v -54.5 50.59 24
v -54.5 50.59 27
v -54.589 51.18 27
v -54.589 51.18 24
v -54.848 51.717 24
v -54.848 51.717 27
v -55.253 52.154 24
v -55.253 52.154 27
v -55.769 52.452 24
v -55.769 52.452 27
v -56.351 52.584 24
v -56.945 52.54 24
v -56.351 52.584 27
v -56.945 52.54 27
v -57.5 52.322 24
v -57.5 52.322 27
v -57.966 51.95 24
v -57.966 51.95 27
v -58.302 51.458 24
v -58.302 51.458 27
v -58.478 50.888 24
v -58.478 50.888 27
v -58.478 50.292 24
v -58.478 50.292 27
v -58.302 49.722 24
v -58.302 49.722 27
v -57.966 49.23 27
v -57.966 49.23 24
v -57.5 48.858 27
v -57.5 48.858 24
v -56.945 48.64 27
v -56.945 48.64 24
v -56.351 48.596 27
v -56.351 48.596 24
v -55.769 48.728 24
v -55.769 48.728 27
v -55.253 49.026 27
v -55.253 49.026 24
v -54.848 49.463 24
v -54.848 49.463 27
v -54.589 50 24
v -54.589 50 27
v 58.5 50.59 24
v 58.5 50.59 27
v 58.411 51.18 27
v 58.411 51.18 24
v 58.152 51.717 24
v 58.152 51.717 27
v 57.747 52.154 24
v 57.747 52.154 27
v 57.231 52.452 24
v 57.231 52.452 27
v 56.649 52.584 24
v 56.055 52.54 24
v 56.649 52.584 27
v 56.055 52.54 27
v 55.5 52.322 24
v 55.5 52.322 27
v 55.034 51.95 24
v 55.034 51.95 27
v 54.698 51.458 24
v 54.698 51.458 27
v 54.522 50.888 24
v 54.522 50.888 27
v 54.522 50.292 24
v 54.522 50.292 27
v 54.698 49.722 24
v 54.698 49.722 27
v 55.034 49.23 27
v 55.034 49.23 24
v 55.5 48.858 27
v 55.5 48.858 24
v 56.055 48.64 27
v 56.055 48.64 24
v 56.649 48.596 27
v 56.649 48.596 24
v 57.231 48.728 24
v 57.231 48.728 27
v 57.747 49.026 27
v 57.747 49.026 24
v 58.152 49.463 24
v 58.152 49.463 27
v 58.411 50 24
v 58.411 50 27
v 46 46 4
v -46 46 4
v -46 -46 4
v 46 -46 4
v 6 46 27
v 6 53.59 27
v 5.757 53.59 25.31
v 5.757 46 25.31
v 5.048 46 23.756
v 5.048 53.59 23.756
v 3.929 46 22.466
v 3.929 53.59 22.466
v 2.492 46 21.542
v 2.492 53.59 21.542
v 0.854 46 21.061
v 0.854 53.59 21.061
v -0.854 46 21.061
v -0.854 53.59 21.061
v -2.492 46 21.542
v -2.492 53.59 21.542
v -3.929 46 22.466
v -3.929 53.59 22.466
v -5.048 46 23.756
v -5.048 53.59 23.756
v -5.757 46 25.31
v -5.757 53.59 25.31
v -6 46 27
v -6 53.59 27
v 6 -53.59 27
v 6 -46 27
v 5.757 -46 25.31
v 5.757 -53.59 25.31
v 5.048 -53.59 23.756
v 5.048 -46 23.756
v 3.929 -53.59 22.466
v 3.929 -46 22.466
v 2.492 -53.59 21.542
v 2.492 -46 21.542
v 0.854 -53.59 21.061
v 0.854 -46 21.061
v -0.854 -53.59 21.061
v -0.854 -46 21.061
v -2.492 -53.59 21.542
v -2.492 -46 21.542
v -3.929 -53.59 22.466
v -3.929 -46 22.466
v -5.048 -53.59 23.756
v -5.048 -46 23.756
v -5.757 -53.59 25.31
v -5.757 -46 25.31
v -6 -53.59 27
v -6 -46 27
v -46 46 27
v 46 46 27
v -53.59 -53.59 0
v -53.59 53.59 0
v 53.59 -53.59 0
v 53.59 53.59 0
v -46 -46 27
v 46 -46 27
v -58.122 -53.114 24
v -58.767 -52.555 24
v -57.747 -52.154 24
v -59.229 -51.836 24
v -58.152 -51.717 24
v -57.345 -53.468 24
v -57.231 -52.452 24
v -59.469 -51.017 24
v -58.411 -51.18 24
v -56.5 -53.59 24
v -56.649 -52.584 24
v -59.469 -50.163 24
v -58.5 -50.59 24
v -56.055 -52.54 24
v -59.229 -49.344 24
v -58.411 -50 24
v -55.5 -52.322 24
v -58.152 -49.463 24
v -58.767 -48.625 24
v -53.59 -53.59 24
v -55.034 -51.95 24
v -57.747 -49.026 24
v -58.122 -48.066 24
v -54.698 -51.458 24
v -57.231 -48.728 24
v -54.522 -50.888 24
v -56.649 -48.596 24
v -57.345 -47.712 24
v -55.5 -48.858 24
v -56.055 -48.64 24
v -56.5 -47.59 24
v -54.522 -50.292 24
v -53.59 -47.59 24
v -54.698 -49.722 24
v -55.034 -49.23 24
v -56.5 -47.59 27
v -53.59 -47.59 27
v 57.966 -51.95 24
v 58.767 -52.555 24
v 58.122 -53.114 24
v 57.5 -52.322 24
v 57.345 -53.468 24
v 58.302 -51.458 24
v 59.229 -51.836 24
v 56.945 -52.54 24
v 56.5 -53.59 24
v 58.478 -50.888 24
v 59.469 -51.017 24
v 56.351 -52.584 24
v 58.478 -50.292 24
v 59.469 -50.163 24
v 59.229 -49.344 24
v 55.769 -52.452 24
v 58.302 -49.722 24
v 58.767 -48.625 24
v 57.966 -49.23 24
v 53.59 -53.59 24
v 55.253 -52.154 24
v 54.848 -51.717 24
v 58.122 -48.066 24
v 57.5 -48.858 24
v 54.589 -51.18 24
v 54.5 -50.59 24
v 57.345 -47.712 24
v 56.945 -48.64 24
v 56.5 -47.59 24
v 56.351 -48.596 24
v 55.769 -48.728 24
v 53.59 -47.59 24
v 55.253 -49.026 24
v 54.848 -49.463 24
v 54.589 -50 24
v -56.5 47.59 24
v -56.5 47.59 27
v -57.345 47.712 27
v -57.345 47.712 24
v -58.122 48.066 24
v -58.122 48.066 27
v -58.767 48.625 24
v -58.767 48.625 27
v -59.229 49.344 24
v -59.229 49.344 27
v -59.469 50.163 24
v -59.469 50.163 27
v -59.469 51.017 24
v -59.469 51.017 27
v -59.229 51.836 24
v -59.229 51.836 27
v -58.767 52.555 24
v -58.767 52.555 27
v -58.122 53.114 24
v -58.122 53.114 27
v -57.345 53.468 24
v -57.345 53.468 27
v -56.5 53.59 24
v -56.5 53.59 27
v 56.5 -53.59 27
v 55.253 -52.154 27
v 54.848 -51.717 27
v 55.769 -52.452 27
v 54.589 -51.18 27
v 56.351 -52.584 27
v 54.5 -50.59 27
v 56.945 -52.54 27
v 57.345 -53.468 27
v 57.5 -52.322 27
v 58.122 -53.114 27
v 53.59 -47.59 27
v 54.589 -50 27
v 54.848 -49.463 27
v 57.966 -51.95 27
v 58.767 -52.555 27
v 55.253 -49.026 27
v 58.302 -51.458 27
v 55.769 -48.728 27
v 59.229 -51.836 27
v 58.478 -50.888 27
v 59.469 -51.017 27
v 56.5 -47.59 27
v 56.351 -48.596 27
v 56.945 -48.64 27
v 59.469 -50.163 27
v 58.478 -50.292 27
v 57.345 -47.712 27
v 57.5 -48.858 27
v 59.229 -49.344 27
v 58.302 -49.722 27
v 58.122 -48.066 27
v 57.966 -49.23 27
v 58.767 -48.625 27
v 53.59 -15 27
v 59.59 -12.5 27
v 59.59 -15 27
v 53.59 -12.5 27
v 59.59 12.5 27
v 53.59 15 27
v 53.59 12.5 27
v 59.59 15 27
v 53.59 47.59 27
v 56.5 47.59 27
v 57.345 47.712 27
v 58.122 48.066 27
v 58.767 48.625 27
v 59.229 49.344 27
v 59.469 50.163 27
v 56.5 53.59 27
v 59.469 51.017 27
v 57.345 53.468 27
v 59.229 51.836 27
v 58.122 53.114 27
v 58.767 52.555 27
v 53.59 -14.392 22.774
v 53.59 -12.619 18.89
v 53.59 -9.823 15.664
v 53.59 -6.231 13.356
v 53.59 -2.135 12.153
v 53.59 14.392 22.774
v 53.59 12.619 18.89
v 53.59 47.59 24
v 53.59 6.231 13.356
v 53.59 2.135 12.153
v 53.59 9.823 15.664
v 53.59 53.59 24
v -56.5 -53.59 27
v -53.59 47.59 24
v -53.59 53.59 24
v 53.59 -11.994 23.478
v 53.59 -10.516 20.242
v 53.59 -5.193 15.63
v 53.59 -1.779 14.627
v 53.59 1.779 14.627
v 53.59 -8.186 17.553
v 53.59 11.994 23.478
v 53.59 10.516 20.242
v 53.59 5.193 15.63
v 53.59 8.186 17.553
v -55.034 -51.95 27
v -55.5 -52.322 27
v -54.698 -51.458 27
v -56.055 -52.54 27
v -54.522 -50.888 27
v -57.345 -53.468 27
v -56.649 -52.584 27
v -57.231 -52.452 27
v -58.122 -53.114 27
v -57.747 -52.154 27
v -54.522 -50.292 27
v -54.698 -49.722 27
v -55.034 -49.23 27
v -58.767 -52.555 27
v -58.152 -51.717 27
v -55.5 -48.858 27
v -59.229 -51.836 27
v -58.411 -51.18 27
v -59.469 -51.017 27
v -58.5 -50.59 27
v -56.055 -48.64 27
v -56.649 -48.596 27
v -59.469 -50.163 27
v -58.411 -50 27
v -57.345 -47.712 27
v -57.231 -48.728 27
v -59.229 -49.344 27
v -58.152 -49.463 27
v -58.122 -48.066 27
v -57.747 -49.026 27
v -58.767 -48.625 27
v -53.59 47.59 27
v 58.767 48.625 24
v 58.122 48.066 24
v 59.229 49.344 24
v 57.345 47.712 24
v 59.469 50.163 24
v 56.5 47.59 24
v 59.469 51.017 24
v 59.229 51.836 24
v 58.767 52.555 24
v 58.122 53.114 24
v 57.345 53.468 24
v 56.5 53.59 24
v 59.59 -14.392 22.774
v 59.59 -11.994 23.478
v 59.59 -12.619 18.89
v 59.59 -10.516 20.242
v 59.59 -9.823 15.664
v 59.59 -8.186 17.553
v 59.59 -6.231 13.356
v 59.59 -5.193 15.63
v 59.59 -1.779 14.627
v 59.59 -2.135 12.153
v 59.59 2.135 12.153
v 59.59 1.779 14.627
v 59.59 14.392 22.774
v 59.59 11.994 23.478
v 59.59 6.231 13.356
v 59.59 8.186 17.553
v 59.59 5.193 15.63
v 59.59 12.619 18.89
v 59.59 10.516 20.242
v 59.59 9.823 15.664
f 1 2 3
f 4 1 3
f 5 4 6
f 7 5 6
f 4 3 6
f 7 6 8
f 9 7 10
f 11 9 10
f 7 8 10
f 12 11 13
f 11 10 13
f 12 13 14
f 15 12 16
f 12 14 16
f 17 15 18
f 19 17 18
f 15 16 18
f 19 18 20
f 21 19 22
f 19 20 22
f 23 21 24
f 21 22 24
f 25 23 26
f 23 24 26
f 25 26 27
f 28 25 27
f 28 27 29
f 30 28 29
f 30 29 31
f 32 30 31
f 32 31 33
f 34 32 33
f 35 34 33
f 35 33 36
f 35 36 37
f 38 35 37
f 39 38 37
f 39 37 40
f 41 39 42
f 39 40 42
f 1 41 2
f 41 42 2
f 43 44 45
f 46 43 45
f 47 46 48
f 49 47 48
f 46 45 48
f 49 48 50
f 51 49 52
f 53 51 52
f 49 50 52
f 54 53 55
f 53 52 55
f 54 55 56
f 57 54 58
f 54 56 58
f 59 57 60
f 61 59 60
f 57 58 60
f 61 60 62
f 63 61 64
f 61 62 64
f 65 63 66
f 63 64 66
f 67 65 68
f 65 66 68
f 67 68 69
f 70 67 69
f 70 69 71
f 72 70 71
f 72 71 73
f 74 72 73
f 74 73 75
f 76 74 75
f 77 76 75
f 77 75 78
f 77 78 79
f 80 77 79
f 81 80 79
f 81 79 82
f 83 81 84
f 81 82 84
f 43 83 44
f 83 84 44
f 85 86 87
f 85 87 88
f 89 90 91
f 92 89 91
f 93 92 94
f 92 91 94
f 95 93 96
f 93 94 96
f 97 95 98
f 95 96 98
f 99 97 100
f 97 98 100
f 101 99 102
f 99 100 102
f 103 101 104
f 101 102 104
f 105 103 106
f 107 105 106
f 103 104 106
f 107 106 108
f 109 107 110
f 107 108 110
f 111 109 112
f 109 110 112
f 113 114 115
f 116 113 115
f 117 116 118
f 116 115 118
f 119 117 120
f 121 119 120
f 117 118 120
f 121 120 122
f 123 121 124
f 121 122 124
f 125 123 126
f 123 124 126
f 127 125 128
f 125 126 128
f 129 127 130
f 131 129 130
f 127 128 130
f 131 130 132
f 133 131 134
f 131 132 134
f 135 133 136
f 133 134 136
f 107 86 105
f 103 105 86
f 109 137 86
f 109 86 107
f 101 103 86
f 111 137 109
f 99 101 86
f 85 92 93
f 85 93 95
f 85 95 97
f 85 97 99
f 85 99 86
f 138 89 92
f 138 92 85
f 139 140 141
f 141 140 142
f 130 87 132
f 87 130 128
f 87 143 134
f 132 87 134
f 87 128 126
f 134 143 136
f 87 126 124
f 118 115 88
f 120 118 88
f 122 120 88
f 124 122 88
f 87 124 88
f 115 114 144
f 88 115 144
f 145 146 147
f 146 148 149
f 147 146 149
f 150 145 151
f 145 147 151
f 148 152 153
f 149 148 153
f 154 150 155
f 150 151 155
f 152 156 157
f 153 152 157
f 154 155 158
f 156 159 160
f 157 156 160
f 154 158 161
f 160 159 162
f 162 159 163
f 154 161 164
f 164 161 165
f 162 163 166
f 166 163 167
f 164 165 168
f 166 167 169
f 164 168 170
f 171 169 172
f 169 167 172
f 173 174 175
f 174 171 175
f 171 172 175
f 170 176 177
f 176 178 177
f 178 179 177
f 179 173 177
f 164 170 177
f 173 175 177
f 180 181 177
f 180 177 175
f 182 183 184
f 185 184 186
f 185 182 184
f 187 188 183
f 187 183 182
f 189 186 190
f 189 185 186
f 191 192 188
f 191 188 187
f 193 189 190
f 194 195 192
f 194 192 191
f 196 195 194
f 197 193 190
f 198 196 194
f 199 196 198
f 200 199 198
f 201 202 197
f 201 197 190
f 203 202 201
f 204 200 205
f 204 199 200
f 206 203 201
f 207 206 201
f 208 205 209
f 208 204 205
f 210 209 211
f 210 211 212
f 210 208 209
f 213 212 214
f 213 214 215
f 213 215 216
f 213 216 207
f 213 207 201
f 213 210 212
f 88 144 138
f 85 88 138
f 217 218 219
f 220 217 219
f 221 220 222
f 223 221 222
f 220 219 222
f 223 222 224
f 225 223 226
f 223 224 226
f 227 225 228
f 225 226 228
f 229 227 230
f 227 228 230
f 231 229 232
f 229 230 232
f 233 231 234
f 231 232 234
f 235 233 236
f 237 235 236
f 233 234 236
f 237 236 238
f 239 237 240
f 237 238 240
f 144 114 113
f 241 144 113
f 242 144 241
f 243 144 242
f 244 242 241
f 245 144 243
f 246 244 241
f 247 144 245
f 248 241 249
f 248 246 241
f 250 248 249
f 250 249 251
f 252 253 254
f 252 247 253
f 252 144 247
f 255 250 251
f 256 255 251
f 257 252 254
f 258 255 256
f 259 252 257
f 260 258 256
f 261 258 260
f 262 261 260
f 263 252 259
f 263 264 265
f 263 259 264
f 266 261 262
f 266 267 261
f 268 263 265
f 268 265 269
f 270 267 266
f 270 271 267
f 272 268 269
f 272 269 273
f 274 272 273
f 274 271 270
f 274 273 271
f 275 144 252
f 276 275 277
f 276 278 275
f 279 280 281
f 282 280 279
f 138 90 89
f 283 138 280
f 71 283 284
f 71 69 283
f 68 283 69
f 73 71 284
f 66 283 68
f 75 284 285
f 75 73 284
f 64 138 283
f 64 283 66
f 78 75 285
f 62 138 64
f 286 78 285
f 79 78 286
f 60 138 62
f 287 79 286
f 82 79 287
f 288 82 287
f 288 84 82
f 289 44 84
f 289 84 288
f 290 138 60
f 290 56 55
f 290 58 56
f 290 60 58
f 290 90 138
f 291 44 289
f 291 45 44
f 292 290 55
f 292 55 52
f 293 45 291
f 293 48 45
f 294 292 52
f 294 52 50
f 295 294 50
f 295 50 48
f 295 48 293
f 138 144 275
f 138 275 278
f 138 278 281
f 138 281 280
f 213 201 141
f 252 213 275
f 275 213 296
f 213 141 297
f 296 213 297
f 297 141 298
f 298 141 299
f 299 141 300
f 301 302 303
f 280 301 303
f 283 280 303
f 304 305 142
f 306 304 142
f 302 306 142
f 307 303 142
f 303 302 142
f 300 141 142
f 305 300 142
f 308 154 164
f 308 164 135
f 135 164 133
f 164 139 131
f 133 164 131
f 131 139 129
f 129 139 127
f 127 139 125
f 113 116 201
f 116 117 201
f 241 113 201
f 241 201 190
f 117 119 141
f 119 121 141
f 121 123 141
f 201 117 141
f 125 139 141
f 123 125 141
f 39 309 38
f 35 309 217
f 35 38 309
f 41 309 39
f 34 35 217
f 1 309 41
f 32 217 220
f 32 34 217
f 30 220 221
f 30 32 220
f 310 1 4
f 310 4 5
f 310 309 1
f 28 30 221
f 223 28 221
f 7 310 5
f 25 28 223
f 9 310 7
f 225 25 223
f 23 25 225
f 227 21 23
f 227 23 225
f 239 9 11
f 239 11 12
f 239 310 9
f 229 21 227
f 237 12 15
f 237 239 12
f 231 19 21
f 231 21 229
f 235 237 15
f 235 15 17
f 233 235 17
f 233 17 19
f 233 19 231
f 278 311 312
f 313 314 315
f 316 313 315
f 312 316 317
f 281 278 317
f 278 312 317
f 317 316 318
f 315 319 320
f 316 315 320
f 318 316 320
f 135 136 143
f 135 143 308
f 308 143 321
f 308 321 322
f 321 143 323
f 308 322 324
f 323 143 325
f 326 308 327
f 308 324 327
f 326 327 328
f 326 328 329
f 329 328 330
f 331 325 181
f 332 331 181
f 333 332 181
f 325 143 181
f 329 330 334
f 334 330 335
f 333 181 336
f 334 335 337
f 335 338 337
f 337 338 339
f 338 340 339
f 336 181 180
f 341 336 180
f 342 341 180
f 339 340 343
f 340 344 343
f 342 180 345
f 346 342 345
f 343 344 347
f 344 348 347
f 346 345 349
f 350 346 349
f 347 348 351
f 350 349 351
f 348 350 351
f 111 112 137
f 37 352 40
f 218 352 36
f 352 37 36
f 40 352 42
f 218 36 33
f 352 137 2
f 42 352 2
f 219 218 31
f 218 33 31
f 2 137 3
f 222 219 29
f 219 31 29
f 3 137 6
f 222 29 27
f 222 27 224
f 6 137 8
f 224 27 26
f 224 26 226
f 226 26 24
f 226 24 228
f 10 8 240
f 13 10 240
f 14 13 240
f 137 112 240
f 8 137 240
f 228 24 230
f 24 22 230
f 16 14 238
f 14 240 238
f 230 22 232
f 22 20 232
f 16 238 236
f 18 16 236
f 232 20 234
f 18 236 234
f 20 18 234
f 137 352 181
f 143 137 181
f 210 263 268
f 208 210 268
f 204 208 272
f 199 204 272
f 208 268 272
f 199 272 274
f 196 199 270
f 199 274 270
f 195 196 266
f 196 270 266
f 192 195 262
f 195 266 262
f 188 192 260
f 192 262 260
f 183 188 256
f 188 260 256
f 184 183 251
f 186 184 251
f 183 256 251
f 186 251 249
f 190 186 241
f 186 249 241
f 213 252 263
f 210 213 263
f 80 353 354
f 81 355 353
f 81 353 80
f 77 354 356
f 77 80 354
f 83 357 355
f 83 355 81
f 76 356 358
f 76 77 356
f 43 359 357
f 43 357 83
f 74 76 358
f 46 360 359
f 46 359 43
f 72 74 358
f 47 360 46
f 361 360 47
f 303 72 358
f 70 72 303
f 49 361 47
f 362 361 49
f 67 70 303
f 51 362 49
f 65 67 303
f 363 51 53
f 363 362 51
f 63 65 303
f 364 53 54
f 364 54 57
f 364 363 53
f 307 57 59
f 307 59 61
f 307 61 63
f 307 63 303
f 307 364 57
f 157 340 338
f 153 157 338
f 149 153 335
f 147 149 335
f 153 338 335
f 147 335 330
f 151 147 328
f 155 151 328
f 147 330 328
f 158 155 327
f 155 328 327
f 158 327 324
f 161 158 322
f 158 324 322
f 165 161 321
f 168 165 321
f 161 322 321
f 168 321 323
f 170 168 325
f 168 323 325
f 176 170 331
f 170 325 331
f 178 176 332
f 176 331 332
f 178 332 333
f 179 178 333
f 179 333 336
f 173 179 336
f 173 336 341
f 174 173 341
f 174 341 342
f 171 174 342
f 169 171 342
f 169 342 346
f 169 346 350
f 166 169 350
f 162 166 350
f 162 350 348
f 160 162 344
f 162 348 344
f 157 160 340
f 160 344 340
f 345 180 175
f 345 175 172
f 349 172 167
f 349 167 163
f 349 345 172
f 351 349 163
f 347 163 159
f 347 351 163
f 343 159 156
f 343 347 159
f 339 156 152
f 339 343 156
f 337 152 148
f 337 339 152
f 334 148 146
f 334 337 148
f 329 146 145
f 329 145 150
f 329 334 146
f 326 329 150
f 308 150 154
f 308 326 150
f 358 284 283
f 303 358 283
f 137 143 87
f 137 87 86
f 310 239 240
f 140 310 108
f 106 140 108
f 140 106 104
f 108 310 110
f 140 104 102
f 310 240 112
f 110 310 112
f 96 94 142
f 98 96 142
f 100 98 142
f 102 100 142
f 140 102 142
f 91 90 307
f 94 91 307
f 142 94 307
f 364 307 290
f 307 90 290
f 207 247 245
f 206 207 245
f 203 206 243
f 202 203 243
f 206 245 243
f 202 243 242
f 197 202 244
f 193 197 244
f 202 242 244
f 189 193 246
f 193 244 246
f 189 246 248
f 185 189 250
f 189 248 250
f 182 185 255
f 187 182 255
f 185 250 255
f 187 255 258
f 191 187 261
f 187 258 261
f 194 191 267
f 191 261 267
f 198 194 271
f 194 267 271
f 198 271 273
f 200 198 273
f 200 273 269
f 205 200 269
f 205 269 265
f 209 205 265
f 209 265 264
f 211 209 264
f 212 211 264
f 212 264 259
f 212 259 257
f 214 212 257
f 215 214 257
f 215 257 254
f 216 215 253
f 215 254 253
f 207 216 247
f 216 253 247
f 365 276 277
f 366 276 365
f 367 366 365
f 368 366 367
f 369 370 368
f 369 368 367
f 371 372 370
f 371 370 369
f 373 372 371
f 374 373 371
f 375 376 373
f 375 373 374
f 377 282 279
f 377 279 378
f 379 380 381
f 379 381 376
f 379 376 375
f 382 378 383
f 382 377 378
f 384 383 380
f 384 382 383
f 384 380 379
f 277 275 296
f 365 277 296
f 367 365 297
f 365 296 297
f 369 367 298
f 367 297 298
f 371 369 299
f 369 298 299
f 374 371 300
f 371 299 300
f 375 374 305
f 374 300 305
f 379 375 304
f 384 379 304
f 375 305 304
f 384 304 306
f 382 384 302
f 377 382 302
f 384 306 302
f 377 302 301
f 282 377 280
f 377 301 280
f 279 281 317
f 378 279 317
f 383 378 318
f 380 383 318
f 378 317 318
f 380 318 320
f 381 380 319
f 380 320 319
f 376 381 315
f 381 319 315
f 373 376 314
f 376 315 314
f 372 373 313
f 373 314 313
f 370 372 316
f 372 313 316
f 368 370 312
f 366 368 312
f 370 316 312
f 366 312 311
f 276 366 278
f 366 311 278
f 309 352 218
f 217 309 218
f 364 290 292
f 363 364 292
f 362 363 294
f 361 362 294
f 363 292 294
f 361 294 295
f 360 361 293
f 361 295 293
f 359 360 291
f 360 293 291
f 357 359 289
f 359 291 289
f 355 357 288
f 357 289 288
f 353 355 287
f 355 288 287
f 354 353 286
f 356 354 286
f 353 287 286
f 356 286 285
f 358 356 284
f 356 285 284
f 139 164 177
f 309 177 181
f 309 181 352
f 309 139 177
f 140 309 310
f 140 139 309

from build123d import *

# Parameters (mm, degrees)
SKETCH_1_W          = 107.18
SKETCH_1_H          = 107.18
EXTRUDE_1_DEPTH     = 27
SKETCH_2_W          = 92
SKETCH_2_H          = 92
CUT_EXTRUDE_1_DEPTH = 23
SKETCH_3_R          = 6
CUT_EXTRUDE_2_DEPTH = 123.835013331
EXTRUDE_3_DEPTH     = 6
SKETCH_7_R          = 2
EXTRUDE_4_DEPTH     = 3


with BuildPart() as part:
    # 草图1 → 凸台-拉伸1 (new body)
    with BuildSketch(Plane.XY):
        Rectangle(SKETCH_1_W, SKETCH_1_H)
    extrude(amount=EXTRUDE_1_DEPTH)

    # 草图2 → 切除-拉伸1 (cut)
    with BuildSketch(Plane.XY.offset(27)):
        Rectangle(SKETCH_2_W, SKETCH_2_H)
    extrude(amount=-CUT_EXTRUDE_1_DEPTH, mode=Mode.SUBTRACT)

    # 草图3 → 切除-拉伸2 (cut, through all)
    with BuildSketch(Plane(origin=(0, 53.59, 0), x_dir=(1, 0, 0), z_dir=(0, 1, 0))):
        with Locations((0, -27)):
            Circle(SKETCH_3_R)
    extrude(amount=-CUT_EXTRUDE_2_DEPTH, mode=Mode.SUBTRACT)

    # 草图5 → 凸台-拉伸3 (add)
    with BuildSketch(Plane(origin=(53.59, 0, 0), x_dir=(0, 0, -1), z_dir=(1, 0, 0))):
        with BuildLine():
            ThreePointArc((-27, -15), (-12, 0), (-27, 15))
            Line((-27, 15), (-27, 12.5))
            ThreePointArc((-27, 12.5), (-14.5, 0), (-27, -12.5))
            Line((-27, -12.5), (-27, -15))
        make_face()
    extrude(amount=EXTRUDE_3_DEPTH)

    # 草图7 → 凸台-拉伸4 (add)
    # profile 1 of 4: a face of its own
    with BuildSketch(Plane.XY.offset(27)):
        with BuildLine():
            Line((-56.5, 53.59), (-49.473493433, 53.59))
            Line((-49.473493433, 53.59), (-49.473493433, 47.59))
            Line((-49.473493433, 47.59), (-56.5, 47.59))
            ThreePointArc((-56.5, 47.59), (-59.5, 50.59), (-56.5, 53.59))
        make_face()
        with Locations((-56.5, 50.59)):
            Circle(SKETCH_7_R, mode=Mode.SUBTRACT)
    # profile 2 of 4: a face of its own
    with BuildSketch(Plane.XY.offset(27)):
        with BuildLine():
            Line((51.172302286, 53.59), (56.5, 53.59))
            ThreePointArc((56.5, 53.59), (59.5, 50.59), (56.5, 47.59))
            Line((56.5, 47.59), (51.172302286, 47.59))
            Line((51.172302286, 47.59), (51.172302286, 53.59))
        make_face()
        with Locations((56.5, 50.59)):
            Circle(SKETCH_7_R, mode=Mode.SUBTRACT)
    # profile 3 of 4: a face of its own
    with BuildSketch(Plane.XY.offset(27)):
        with BuildLine():
            Line((51.172302286, -47.59), (56.5, -47.59))
            ThreePointArc((56.5, -47.59), (59.5, -50.59), (56.5, -53.59))
            Line((56.5, -53.59), (51.172302286, -53.59))
            Line((51.172302286, -53.59), (51.172302286, -47.59))
        make_face()
        with Locations(Location((56.5, -50.59, 0), (0, 0, 180))):
            Circle(SKETCH_7_R, mode=Mode.SUBTRACT)
    # profile 4 of 4: a face of its own
    with BuildSketch(Plane.XY.offset(27)):
        with BuildLine():
            Line((-49.473493433, -53.59), (-49.473493433, -47.59))
            Line((-49.473493433, -47.59), (-56.5, -47.59))
            ThreePointArc((-56.5, -47.59), (-59.5, -50.59), (-56.5, -53.59))
            Line((-56.5, -53.59), (-49.473493433, -53.59))
        make_face()
        with Locations(Location((-56.5, -50.59, 0), (0, 0, 180))):
            Circle(SKETCH_7_R, mode=Mode.SUBTRACT)
    extrude(amount=-EXTRUDE_4_DEPTH)


solid = part.part
